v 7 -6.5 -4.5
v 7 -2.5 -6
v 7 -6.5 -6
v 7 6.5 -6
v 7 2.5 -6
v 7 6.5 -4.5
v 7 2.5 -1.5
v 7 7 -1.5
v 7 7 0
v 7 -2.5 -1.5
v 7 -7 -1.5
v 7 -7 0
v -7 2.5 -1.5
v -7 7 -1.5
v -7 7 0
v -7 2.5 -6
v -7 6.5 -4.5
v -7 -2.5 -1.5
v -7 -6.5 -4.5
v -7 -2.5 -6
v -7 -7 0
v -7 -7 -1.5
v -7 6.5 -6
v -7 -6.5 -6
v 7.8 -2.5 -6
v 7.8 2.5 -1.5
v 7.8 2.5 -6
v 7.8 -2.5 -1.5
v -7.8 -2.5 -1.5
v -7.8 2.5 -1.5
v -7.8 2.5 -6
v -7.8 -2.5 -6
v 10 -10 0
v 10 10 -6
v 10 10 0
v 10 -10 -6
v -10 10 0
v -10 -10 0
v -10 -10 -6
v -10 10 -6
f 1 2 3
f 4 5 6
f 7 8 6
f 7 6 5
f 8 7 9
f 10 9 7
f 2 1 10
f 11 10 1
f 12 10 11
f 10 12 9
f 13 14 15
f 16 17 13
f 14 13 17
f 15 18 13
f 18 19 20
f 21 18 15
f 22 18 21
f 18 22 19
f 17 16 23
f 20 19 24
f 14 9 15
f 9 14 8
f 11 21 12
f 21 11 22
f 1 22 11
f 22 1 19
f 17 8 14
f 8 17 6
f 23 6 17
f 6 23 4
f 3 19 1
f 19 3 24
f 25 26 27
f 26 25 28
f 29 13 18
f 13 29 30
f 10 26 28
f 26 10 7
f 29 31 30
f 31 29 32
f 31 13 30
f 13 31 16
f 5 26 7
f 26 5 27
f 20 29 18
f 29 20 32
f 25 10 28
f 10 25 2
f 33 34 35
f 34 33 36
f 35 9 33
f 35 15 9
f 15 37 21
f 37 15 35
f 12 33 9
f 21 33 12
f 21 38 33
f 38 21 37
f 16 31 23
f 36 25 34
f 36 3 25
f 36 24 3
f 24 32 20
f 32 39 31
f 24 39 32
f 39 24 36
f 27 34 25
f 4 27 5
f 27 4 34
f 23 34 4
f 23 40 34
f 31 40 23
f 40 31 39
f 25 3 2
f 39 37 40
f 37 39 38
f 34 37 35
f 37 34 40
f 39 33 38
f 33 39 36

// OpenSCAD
module SideCutout()
{
	translate([0, -14 / 2, -1.5])
	rotate(90, [0, 1, 0])
	linear_extrude(height = 14, center = true)
	polygon([[0, 0], [3, 0], [3, 0.5]]);
}

module SwitchCutout(depth)
{
	difference()
	{
		translate([-14 / 2, -14 / 2, -1.5 - 3])
		cube([14, 14, depth / 2 + 1.5 + 3]);

		SideCutout();

		mirror([0, 1, 0])
		SideCutout();
	}

	cube([14, 13, depth], center = true);

	translate([-15.6 / 2, -5 / 2, -depth / 2])
	cube([15.6, 5, depth / 2 - 1.5]);
}

module SwitchTest()
{
	difference()
	{
		translate([0, 0, -6 / 2])
		cube([20, 20, 6], center = true);
		
		SwitchCutout(15);
	}
}

SwitchTest();
